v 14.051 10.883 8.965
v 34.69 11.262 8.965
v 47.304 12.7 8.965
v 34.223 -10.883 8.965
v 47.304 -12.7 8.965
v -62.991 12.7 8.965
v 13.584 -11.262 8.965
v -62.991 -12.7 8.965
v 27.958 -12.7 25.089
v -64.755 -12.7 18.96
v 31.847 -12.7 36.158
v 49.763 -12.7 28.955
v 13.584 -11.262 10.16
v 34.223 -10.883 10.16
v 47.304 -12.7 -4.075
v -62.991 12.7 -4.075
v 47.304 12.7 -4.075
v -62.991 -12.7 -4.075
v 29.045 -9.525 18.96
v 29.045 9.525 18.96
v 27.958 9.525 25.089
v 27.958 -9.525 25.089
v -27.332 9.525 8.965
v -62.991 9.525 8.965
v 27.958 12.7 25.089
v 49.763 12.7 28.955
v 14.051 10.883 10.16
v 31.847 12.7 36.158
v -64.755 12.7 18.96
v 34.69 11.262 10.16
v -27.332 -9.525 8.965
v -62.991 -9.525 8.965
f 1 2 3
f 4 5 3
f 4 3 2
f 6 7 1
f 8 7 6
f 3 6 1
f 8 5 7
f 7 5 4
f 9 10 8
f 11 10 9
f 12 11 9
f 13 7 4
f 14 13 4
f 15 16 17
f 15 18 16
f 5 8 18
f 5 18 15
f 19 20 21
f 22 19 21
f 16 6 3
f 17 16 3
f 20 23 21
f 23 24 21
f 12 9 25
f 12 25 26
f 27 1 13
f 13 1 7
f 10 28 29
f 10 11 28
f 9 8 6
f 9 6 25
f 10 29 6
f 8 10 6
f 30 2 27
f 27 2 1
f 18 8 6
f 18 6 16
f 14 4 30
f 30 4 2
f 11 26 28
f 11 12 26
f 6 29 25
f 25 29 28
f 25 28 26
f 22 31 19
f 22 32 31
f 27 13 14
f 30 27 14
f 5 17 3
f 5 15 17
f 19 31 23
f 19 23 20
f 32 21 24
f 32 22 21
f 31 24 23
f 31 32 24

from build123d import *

# Parameters (mm, degrees)
F1_DEPTH = 12.7
F2_DEPTH = 9.525
F4_DEPTH = 10.16


with BuildPart() as f1:
    # F0 (on Front) → F1 (new body, symmetric)
    with BuildSketch(Plane.XZ):
        Polygon((-64.755325, 18.960131), (-62.99147, 8.964936), (27.957994, 25.088938), (49.762625, 28.954579), (31.846724, 36.157791), align=None)
        Polygon((47.304407, -4.07497), (47.304407, 8.964936), (-27.33244, 8.964936), (-62.99147, 8.964936), (-62.99147, -4.07497), align=None)
    extrude(amount=F1_DEPTH, both=True)

    # F3 (on Top) → F4 (join)
    with BuildSketch(Plane.XY):
        Polygon((24.137095, 0), (14.05099, 10.882558), (13.583876, -11.261532), align=None)
        Polygon((34.690313, 11.261532), (14.05099, 10.882558), (24.137095, 0), align=None)
        Polygon((24.137095, 0), (13.583876, -11.261532), (34.223199, -10.882558), align=None)
        Polygon((34.690313, 11.261532), (24.137095, 0), (34.223199, -10.882558), align=None)
    extrude(amount=F4_DEPTH)


with BuildPart() as f2:
    # F0 (on Front) → F2 (new body, symmetric)
    with BuildSketch(Plane.XZ):
        Polygon((-62.99147, 8.964936), (-27.33244, 8.964936), (29.044608, 18.959757), (27.957994, 25.088938), align=None)
    extrude(amount=F2_DEPTH, both=True)


solid = Compound([f1.part, f2.part])
